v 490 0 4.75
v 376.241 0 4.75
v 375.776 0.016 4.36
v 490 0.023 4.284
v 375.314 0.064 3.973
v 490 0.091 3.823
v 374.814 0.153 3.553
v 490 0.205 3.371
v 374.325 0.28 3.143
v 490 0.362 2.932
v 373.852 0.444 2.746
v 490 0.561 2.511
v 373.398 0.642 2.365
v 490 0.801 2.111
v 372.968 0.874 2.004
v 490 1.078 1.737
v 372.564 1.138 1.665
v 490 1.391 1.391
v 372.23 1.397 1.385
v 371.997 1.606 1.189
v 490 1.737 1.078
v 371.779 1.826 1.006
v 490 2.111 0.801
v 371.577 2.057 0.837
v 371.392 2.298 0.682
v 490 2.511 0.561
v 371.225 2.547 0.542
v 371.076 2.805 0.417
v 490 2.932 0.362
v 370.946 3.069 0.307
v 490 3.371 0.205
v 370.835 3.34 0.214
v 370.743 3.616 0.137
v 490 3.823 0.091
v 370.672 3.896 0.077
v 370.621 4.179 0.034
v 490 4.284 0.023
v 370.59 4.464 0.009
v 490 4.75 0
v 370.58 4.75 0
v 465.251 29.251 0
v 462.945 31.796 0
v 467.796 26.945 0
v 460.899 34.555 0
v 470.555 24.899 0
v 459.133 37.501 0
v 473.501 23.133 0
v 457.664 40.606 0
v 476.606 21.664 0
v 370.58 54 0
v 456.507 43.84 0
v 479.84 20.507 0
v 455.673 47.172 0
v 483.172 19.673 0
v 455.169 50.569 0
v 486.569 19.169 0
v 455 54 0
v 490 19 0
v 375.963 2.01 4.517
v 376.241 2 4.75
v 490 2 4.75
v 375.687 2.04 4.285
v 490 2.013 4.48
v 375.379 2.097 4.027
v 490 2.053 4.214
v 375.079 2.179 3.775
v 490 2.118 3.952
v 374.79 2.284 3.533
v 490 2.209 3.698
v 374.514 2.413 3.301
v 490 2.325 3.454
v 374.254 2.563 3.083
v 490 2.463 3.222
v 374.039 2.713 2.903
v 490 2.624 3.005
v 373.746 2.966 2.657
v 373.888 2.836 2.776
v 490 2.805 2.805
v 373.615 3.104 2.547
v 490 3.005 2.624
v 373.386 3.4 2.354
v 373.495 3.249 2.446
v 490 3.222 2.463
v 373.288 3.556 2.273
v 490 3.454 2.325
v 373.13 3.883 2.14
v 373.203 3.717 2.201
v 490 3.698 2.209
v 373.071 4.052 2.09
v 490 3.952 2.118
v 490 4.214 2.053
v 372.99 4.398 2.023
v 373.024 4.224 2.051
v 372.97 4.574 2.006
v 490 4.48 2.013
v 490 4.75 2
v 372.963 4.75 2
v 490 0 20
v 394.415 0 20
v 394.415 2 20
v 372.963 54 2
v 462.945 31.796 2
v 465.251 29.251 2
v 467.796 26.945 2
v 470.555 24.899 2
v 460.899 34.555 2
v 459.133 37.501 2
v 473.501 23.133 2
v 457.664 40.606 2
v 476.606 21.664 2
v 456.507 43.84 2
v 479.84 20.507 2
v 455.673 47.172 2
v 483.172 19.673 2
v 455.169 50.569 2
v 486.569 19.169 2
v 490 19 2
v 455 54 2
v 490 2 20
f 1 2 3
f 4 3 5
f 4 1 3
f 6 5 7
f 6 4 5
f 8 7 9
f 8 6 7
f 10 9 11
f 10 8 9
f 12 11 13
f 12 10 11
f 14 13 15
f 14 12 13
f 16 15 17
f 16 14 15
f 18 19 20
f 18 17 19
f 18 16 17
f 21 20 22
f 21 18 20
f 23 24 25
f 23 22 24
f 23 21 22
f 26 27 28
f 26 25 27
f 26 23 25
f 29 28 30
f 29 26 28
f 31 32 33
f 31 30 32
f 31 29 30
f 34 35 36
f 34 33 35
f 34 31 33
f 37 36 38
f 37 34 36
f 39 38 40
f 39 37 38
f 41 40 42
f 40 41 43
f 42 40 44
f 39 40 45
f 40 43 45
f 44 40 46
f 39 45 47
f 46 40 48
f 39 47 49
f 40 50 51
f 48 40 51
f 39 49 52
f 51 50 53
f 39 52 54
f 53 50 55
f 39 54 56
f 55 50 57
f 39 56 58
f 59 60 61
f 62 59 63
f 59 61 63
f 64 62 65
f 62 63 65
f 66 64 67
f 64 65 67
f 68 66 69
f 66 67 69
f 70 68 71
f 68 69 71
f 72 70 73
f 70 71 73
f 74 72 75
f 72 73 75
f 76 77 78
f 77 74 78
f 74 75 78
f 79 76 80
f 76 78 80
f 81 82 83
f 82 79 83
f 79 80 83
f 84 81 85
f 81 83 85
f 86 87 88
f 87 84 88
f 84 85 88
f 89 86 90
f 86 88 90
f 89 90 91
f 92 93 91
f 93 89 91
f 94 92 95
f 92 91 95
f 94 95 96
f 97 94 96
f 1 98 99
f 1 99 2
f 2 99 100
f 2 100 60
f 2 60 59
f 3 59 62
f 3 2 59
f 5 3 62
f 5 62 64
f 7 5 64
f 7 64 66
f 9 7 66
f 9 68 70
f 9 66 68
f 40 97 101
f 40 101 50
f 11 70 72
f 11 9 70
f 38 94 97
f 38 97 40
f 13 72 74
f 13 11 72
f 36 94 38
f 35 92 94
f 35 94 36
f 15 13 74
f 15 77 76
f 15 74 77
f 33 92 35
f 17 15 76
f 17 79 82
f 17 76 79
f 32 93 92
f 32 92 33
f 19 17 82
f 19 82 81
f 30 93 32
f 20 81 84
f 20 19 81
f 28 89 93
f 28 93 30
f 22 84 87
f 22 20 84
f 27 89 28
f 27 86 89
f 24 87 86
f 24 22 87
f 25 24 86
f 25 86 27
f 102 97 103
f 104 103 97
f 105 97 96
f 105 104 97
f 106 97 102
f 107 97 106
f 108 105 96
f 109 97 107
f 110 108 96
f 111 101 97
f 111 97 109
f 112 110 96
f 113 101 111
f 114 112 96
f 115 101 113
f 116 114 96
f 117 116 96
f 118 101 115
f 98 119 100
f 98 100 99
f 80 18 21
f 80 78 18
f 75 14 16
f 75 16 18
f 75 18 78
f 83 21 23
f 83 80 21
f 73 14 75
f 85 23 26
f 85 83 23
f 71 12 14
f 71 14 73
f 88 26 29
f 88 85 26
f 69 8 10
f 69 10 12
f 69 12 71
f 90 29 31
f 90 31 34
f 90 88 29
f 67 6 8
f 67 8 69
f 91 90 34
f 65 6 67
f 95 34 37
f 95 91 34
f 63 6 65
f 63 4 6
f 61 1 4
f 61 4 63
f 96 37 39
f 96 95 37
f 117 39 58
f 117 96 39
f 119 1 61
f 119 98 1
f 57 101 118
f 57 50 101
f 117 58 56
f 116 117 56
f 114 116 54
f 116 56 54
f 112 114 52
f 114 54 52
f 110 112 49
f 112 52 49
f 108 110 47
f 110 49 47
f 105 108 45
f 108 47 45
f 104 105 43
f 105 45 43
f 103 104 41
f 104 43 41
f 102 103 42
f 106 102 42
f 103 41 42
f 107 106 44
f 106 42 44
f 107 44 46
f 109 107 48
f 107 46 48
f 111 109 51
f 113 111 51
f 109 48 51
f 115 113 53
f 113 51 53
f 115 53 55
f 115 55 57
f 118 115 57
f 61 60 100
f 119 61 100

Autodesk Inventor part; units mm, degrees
ref_plane "YZ Plane" through (0, 0, 0) normal (1, 0, 0) x (0, 1, 0)
ref_plane "XZ Plane" through (0, 0, 0) normal (0, 1, 0) x (-1, 0, 0)
ref_plane "XY Plane" through (0, 0, 0) normal (0, 0, 1) x (1, 0, 0)
sketch "Sketch1" plane through (0, 0, 0) normal (0, 0, 1) x (1, 0, 0)
  line L0 (-490, 54) -> (490, 54)
  line L1 (490, 54) -> (490, 0)
  line L2 (490, 0) -> (-490, 0)
  line L3 (-490, 0) -> (-490, 54)
  point P0 (0, 0)
  point P1 (0, 0)
  dimension "d0" = 980
  dimension "d1" = 54
extrude "Plate1" add sketch "Sketch1" along normal blind 2
sketch "Sketch2" plane through (490, 2, 0) normal (0, -1, 0) x (1, 0, 0)
  line L0 (-980, 0) -> (0, 0)
  line L1 (0, 0) -> (0, 20)
  line L2 (0, 20) -> (-980, 20)
  line L3 (-980, 20) -> (-980, 0)
edge flange "Flange1" height 20 angle 90 thickness 2 bend radius 2.75 thickness toward (0, -1, 0) relief round relief width 2 relief depth 1 edges at (0, 0, 2) wall of the first edge with corners at (-490, 2, 0) (490, 2, 0) (490, 2, 20) (-490, 2, 20)
bend "Bend1"
corner "Corner1"
sketch "Sketch5" plane through (0, 0, 0) normal (0, 0, -1) x (-1, 0, 0)
  line L0 (490, 54) -> (-490, 54) projected
  line L1 (490, 0) -> (-490, 0) projected
  circle A0 centre (0, 54) radius 35
  line L2 (243.95, 54) -> (246.05, 54)
  line L3 (246.05, 54) -> (246.05, 29)
  line L4 (246.05, 29) -> (243.95, 29)
  line L5 (243.95, 29) -> (243.95, 54)
  line L6 (-243.95, 54) -> (-246.05, 54)
  line L7 (-246.05, 54) -> (-246.05, 29)
  line L8 (-246.05, 29) -> (-243.95, 29)
  line L9 (-243.95, 29) -> (-243.95, 54)
  line L10 (0, 54) -> (0, 0) construction
  circle A1 centre (-490, 54) radius 35
  point P0 (0, 0)
  point P1 (245, 29)
  point P2 (-245, 29)
  point P3 (246.05, 54)
  point P4 (-35, 54)
  point P5 (35, 54)
  point P6 (-246.05, 54)
  dimension "d45" = 70
  dimension "d48" = 2.1
  dimension "d49" = 490
  dimension "d51" = 29
  dimension "d52" = 25
extrude "Extrusion1" cut sketch "Sketch5" against normal through all contours L3 L4 L5 L0 | L9 L8 L7 L0 | A0 L0 | A1 picked at (-5.9248, 35.8306)
sketch "Sketch9" plane through (0, 0, 2) normal (0, 0, 1) x (1, 0, 0)
  line L0 (485.6141, 29.596) -> (485.6141, 17.596) construction
  line L1 (485.6141, 17.596) -> (285.6141, 17.596) construction
  line L2 (285.6141, 17.596) -> (285.6141, 29.596) construction
  line L3 (285.6141, 29.596) -> (485.6141, 29.596) construction
  line L4 (-490, 54) -> (490, 54) projected
  point P0 (0, 0)
  point P1 (1.05, 68)
  point P2 (490, 54)
  dimension "d40" = 200
  dimension "d41" = 12
mark "Mark2"
sketch "Sketch10" plane through (-490, 0, 20) normal (0, -1, 0) x (1, 0, 0)
  line L0 (0, -20) -> (0, -18) projected
  line L1 (0, 0) -> (980, 0) projected
  line L2 (0, -20) -> (884.4148, -20)
  line L3 (884.4148, -20) -> (884.4148, 0)
  line L4 (884.4148, 0) -> (0, 0)
  line L5 (0, 0) -> (0, -20)
  line L6 (884.4148, 0) -> (860.5797, -20)
  point P0 (490, -20)
  dimension "d53" = 50
  dimension "d54" = 884.4148
extrude "Extrusion4" cut sketch "Sketch10" against normal through all contours L0 L5 L1 L6 L2
equation "\"d2\" = Thickness"
equation "\"d3\" = BendReliefWidth"
equation "\"d4\" = BendReliefDepth"
equation "\"d5\" = MinimumRemnant"
equation "\"d6\" = TransitionRadius"
equation "\"d9\" = BendRadius"
equation "\"d10\" = CornerReliefSize"
equation "\"d11\" = GapSize"
equation "\"d12\" = JacobiRadiusSize"
equation "\"BendReliefWidth\" = Thickness"
equation "\"BendReliefDepth\" = 0.5 * Thickness"
equation "\"CornerReliefSize\" = 4 * Thickness"
equation "\"MinimumRemnant\" = 2 * Thickness"
equation "\"TransitionRadius\" = BendRadius"
equation "\"JacobiRadiusSize\" = BendRadius"
equation "\"GapSize\" = Thickness"
equation "\"Thickness\" = 2"
equation "\"BendRadius\" = 2.75"
properties part number "MSC 327 STRINGER BOARD  ###" material "Stainless Steel"
